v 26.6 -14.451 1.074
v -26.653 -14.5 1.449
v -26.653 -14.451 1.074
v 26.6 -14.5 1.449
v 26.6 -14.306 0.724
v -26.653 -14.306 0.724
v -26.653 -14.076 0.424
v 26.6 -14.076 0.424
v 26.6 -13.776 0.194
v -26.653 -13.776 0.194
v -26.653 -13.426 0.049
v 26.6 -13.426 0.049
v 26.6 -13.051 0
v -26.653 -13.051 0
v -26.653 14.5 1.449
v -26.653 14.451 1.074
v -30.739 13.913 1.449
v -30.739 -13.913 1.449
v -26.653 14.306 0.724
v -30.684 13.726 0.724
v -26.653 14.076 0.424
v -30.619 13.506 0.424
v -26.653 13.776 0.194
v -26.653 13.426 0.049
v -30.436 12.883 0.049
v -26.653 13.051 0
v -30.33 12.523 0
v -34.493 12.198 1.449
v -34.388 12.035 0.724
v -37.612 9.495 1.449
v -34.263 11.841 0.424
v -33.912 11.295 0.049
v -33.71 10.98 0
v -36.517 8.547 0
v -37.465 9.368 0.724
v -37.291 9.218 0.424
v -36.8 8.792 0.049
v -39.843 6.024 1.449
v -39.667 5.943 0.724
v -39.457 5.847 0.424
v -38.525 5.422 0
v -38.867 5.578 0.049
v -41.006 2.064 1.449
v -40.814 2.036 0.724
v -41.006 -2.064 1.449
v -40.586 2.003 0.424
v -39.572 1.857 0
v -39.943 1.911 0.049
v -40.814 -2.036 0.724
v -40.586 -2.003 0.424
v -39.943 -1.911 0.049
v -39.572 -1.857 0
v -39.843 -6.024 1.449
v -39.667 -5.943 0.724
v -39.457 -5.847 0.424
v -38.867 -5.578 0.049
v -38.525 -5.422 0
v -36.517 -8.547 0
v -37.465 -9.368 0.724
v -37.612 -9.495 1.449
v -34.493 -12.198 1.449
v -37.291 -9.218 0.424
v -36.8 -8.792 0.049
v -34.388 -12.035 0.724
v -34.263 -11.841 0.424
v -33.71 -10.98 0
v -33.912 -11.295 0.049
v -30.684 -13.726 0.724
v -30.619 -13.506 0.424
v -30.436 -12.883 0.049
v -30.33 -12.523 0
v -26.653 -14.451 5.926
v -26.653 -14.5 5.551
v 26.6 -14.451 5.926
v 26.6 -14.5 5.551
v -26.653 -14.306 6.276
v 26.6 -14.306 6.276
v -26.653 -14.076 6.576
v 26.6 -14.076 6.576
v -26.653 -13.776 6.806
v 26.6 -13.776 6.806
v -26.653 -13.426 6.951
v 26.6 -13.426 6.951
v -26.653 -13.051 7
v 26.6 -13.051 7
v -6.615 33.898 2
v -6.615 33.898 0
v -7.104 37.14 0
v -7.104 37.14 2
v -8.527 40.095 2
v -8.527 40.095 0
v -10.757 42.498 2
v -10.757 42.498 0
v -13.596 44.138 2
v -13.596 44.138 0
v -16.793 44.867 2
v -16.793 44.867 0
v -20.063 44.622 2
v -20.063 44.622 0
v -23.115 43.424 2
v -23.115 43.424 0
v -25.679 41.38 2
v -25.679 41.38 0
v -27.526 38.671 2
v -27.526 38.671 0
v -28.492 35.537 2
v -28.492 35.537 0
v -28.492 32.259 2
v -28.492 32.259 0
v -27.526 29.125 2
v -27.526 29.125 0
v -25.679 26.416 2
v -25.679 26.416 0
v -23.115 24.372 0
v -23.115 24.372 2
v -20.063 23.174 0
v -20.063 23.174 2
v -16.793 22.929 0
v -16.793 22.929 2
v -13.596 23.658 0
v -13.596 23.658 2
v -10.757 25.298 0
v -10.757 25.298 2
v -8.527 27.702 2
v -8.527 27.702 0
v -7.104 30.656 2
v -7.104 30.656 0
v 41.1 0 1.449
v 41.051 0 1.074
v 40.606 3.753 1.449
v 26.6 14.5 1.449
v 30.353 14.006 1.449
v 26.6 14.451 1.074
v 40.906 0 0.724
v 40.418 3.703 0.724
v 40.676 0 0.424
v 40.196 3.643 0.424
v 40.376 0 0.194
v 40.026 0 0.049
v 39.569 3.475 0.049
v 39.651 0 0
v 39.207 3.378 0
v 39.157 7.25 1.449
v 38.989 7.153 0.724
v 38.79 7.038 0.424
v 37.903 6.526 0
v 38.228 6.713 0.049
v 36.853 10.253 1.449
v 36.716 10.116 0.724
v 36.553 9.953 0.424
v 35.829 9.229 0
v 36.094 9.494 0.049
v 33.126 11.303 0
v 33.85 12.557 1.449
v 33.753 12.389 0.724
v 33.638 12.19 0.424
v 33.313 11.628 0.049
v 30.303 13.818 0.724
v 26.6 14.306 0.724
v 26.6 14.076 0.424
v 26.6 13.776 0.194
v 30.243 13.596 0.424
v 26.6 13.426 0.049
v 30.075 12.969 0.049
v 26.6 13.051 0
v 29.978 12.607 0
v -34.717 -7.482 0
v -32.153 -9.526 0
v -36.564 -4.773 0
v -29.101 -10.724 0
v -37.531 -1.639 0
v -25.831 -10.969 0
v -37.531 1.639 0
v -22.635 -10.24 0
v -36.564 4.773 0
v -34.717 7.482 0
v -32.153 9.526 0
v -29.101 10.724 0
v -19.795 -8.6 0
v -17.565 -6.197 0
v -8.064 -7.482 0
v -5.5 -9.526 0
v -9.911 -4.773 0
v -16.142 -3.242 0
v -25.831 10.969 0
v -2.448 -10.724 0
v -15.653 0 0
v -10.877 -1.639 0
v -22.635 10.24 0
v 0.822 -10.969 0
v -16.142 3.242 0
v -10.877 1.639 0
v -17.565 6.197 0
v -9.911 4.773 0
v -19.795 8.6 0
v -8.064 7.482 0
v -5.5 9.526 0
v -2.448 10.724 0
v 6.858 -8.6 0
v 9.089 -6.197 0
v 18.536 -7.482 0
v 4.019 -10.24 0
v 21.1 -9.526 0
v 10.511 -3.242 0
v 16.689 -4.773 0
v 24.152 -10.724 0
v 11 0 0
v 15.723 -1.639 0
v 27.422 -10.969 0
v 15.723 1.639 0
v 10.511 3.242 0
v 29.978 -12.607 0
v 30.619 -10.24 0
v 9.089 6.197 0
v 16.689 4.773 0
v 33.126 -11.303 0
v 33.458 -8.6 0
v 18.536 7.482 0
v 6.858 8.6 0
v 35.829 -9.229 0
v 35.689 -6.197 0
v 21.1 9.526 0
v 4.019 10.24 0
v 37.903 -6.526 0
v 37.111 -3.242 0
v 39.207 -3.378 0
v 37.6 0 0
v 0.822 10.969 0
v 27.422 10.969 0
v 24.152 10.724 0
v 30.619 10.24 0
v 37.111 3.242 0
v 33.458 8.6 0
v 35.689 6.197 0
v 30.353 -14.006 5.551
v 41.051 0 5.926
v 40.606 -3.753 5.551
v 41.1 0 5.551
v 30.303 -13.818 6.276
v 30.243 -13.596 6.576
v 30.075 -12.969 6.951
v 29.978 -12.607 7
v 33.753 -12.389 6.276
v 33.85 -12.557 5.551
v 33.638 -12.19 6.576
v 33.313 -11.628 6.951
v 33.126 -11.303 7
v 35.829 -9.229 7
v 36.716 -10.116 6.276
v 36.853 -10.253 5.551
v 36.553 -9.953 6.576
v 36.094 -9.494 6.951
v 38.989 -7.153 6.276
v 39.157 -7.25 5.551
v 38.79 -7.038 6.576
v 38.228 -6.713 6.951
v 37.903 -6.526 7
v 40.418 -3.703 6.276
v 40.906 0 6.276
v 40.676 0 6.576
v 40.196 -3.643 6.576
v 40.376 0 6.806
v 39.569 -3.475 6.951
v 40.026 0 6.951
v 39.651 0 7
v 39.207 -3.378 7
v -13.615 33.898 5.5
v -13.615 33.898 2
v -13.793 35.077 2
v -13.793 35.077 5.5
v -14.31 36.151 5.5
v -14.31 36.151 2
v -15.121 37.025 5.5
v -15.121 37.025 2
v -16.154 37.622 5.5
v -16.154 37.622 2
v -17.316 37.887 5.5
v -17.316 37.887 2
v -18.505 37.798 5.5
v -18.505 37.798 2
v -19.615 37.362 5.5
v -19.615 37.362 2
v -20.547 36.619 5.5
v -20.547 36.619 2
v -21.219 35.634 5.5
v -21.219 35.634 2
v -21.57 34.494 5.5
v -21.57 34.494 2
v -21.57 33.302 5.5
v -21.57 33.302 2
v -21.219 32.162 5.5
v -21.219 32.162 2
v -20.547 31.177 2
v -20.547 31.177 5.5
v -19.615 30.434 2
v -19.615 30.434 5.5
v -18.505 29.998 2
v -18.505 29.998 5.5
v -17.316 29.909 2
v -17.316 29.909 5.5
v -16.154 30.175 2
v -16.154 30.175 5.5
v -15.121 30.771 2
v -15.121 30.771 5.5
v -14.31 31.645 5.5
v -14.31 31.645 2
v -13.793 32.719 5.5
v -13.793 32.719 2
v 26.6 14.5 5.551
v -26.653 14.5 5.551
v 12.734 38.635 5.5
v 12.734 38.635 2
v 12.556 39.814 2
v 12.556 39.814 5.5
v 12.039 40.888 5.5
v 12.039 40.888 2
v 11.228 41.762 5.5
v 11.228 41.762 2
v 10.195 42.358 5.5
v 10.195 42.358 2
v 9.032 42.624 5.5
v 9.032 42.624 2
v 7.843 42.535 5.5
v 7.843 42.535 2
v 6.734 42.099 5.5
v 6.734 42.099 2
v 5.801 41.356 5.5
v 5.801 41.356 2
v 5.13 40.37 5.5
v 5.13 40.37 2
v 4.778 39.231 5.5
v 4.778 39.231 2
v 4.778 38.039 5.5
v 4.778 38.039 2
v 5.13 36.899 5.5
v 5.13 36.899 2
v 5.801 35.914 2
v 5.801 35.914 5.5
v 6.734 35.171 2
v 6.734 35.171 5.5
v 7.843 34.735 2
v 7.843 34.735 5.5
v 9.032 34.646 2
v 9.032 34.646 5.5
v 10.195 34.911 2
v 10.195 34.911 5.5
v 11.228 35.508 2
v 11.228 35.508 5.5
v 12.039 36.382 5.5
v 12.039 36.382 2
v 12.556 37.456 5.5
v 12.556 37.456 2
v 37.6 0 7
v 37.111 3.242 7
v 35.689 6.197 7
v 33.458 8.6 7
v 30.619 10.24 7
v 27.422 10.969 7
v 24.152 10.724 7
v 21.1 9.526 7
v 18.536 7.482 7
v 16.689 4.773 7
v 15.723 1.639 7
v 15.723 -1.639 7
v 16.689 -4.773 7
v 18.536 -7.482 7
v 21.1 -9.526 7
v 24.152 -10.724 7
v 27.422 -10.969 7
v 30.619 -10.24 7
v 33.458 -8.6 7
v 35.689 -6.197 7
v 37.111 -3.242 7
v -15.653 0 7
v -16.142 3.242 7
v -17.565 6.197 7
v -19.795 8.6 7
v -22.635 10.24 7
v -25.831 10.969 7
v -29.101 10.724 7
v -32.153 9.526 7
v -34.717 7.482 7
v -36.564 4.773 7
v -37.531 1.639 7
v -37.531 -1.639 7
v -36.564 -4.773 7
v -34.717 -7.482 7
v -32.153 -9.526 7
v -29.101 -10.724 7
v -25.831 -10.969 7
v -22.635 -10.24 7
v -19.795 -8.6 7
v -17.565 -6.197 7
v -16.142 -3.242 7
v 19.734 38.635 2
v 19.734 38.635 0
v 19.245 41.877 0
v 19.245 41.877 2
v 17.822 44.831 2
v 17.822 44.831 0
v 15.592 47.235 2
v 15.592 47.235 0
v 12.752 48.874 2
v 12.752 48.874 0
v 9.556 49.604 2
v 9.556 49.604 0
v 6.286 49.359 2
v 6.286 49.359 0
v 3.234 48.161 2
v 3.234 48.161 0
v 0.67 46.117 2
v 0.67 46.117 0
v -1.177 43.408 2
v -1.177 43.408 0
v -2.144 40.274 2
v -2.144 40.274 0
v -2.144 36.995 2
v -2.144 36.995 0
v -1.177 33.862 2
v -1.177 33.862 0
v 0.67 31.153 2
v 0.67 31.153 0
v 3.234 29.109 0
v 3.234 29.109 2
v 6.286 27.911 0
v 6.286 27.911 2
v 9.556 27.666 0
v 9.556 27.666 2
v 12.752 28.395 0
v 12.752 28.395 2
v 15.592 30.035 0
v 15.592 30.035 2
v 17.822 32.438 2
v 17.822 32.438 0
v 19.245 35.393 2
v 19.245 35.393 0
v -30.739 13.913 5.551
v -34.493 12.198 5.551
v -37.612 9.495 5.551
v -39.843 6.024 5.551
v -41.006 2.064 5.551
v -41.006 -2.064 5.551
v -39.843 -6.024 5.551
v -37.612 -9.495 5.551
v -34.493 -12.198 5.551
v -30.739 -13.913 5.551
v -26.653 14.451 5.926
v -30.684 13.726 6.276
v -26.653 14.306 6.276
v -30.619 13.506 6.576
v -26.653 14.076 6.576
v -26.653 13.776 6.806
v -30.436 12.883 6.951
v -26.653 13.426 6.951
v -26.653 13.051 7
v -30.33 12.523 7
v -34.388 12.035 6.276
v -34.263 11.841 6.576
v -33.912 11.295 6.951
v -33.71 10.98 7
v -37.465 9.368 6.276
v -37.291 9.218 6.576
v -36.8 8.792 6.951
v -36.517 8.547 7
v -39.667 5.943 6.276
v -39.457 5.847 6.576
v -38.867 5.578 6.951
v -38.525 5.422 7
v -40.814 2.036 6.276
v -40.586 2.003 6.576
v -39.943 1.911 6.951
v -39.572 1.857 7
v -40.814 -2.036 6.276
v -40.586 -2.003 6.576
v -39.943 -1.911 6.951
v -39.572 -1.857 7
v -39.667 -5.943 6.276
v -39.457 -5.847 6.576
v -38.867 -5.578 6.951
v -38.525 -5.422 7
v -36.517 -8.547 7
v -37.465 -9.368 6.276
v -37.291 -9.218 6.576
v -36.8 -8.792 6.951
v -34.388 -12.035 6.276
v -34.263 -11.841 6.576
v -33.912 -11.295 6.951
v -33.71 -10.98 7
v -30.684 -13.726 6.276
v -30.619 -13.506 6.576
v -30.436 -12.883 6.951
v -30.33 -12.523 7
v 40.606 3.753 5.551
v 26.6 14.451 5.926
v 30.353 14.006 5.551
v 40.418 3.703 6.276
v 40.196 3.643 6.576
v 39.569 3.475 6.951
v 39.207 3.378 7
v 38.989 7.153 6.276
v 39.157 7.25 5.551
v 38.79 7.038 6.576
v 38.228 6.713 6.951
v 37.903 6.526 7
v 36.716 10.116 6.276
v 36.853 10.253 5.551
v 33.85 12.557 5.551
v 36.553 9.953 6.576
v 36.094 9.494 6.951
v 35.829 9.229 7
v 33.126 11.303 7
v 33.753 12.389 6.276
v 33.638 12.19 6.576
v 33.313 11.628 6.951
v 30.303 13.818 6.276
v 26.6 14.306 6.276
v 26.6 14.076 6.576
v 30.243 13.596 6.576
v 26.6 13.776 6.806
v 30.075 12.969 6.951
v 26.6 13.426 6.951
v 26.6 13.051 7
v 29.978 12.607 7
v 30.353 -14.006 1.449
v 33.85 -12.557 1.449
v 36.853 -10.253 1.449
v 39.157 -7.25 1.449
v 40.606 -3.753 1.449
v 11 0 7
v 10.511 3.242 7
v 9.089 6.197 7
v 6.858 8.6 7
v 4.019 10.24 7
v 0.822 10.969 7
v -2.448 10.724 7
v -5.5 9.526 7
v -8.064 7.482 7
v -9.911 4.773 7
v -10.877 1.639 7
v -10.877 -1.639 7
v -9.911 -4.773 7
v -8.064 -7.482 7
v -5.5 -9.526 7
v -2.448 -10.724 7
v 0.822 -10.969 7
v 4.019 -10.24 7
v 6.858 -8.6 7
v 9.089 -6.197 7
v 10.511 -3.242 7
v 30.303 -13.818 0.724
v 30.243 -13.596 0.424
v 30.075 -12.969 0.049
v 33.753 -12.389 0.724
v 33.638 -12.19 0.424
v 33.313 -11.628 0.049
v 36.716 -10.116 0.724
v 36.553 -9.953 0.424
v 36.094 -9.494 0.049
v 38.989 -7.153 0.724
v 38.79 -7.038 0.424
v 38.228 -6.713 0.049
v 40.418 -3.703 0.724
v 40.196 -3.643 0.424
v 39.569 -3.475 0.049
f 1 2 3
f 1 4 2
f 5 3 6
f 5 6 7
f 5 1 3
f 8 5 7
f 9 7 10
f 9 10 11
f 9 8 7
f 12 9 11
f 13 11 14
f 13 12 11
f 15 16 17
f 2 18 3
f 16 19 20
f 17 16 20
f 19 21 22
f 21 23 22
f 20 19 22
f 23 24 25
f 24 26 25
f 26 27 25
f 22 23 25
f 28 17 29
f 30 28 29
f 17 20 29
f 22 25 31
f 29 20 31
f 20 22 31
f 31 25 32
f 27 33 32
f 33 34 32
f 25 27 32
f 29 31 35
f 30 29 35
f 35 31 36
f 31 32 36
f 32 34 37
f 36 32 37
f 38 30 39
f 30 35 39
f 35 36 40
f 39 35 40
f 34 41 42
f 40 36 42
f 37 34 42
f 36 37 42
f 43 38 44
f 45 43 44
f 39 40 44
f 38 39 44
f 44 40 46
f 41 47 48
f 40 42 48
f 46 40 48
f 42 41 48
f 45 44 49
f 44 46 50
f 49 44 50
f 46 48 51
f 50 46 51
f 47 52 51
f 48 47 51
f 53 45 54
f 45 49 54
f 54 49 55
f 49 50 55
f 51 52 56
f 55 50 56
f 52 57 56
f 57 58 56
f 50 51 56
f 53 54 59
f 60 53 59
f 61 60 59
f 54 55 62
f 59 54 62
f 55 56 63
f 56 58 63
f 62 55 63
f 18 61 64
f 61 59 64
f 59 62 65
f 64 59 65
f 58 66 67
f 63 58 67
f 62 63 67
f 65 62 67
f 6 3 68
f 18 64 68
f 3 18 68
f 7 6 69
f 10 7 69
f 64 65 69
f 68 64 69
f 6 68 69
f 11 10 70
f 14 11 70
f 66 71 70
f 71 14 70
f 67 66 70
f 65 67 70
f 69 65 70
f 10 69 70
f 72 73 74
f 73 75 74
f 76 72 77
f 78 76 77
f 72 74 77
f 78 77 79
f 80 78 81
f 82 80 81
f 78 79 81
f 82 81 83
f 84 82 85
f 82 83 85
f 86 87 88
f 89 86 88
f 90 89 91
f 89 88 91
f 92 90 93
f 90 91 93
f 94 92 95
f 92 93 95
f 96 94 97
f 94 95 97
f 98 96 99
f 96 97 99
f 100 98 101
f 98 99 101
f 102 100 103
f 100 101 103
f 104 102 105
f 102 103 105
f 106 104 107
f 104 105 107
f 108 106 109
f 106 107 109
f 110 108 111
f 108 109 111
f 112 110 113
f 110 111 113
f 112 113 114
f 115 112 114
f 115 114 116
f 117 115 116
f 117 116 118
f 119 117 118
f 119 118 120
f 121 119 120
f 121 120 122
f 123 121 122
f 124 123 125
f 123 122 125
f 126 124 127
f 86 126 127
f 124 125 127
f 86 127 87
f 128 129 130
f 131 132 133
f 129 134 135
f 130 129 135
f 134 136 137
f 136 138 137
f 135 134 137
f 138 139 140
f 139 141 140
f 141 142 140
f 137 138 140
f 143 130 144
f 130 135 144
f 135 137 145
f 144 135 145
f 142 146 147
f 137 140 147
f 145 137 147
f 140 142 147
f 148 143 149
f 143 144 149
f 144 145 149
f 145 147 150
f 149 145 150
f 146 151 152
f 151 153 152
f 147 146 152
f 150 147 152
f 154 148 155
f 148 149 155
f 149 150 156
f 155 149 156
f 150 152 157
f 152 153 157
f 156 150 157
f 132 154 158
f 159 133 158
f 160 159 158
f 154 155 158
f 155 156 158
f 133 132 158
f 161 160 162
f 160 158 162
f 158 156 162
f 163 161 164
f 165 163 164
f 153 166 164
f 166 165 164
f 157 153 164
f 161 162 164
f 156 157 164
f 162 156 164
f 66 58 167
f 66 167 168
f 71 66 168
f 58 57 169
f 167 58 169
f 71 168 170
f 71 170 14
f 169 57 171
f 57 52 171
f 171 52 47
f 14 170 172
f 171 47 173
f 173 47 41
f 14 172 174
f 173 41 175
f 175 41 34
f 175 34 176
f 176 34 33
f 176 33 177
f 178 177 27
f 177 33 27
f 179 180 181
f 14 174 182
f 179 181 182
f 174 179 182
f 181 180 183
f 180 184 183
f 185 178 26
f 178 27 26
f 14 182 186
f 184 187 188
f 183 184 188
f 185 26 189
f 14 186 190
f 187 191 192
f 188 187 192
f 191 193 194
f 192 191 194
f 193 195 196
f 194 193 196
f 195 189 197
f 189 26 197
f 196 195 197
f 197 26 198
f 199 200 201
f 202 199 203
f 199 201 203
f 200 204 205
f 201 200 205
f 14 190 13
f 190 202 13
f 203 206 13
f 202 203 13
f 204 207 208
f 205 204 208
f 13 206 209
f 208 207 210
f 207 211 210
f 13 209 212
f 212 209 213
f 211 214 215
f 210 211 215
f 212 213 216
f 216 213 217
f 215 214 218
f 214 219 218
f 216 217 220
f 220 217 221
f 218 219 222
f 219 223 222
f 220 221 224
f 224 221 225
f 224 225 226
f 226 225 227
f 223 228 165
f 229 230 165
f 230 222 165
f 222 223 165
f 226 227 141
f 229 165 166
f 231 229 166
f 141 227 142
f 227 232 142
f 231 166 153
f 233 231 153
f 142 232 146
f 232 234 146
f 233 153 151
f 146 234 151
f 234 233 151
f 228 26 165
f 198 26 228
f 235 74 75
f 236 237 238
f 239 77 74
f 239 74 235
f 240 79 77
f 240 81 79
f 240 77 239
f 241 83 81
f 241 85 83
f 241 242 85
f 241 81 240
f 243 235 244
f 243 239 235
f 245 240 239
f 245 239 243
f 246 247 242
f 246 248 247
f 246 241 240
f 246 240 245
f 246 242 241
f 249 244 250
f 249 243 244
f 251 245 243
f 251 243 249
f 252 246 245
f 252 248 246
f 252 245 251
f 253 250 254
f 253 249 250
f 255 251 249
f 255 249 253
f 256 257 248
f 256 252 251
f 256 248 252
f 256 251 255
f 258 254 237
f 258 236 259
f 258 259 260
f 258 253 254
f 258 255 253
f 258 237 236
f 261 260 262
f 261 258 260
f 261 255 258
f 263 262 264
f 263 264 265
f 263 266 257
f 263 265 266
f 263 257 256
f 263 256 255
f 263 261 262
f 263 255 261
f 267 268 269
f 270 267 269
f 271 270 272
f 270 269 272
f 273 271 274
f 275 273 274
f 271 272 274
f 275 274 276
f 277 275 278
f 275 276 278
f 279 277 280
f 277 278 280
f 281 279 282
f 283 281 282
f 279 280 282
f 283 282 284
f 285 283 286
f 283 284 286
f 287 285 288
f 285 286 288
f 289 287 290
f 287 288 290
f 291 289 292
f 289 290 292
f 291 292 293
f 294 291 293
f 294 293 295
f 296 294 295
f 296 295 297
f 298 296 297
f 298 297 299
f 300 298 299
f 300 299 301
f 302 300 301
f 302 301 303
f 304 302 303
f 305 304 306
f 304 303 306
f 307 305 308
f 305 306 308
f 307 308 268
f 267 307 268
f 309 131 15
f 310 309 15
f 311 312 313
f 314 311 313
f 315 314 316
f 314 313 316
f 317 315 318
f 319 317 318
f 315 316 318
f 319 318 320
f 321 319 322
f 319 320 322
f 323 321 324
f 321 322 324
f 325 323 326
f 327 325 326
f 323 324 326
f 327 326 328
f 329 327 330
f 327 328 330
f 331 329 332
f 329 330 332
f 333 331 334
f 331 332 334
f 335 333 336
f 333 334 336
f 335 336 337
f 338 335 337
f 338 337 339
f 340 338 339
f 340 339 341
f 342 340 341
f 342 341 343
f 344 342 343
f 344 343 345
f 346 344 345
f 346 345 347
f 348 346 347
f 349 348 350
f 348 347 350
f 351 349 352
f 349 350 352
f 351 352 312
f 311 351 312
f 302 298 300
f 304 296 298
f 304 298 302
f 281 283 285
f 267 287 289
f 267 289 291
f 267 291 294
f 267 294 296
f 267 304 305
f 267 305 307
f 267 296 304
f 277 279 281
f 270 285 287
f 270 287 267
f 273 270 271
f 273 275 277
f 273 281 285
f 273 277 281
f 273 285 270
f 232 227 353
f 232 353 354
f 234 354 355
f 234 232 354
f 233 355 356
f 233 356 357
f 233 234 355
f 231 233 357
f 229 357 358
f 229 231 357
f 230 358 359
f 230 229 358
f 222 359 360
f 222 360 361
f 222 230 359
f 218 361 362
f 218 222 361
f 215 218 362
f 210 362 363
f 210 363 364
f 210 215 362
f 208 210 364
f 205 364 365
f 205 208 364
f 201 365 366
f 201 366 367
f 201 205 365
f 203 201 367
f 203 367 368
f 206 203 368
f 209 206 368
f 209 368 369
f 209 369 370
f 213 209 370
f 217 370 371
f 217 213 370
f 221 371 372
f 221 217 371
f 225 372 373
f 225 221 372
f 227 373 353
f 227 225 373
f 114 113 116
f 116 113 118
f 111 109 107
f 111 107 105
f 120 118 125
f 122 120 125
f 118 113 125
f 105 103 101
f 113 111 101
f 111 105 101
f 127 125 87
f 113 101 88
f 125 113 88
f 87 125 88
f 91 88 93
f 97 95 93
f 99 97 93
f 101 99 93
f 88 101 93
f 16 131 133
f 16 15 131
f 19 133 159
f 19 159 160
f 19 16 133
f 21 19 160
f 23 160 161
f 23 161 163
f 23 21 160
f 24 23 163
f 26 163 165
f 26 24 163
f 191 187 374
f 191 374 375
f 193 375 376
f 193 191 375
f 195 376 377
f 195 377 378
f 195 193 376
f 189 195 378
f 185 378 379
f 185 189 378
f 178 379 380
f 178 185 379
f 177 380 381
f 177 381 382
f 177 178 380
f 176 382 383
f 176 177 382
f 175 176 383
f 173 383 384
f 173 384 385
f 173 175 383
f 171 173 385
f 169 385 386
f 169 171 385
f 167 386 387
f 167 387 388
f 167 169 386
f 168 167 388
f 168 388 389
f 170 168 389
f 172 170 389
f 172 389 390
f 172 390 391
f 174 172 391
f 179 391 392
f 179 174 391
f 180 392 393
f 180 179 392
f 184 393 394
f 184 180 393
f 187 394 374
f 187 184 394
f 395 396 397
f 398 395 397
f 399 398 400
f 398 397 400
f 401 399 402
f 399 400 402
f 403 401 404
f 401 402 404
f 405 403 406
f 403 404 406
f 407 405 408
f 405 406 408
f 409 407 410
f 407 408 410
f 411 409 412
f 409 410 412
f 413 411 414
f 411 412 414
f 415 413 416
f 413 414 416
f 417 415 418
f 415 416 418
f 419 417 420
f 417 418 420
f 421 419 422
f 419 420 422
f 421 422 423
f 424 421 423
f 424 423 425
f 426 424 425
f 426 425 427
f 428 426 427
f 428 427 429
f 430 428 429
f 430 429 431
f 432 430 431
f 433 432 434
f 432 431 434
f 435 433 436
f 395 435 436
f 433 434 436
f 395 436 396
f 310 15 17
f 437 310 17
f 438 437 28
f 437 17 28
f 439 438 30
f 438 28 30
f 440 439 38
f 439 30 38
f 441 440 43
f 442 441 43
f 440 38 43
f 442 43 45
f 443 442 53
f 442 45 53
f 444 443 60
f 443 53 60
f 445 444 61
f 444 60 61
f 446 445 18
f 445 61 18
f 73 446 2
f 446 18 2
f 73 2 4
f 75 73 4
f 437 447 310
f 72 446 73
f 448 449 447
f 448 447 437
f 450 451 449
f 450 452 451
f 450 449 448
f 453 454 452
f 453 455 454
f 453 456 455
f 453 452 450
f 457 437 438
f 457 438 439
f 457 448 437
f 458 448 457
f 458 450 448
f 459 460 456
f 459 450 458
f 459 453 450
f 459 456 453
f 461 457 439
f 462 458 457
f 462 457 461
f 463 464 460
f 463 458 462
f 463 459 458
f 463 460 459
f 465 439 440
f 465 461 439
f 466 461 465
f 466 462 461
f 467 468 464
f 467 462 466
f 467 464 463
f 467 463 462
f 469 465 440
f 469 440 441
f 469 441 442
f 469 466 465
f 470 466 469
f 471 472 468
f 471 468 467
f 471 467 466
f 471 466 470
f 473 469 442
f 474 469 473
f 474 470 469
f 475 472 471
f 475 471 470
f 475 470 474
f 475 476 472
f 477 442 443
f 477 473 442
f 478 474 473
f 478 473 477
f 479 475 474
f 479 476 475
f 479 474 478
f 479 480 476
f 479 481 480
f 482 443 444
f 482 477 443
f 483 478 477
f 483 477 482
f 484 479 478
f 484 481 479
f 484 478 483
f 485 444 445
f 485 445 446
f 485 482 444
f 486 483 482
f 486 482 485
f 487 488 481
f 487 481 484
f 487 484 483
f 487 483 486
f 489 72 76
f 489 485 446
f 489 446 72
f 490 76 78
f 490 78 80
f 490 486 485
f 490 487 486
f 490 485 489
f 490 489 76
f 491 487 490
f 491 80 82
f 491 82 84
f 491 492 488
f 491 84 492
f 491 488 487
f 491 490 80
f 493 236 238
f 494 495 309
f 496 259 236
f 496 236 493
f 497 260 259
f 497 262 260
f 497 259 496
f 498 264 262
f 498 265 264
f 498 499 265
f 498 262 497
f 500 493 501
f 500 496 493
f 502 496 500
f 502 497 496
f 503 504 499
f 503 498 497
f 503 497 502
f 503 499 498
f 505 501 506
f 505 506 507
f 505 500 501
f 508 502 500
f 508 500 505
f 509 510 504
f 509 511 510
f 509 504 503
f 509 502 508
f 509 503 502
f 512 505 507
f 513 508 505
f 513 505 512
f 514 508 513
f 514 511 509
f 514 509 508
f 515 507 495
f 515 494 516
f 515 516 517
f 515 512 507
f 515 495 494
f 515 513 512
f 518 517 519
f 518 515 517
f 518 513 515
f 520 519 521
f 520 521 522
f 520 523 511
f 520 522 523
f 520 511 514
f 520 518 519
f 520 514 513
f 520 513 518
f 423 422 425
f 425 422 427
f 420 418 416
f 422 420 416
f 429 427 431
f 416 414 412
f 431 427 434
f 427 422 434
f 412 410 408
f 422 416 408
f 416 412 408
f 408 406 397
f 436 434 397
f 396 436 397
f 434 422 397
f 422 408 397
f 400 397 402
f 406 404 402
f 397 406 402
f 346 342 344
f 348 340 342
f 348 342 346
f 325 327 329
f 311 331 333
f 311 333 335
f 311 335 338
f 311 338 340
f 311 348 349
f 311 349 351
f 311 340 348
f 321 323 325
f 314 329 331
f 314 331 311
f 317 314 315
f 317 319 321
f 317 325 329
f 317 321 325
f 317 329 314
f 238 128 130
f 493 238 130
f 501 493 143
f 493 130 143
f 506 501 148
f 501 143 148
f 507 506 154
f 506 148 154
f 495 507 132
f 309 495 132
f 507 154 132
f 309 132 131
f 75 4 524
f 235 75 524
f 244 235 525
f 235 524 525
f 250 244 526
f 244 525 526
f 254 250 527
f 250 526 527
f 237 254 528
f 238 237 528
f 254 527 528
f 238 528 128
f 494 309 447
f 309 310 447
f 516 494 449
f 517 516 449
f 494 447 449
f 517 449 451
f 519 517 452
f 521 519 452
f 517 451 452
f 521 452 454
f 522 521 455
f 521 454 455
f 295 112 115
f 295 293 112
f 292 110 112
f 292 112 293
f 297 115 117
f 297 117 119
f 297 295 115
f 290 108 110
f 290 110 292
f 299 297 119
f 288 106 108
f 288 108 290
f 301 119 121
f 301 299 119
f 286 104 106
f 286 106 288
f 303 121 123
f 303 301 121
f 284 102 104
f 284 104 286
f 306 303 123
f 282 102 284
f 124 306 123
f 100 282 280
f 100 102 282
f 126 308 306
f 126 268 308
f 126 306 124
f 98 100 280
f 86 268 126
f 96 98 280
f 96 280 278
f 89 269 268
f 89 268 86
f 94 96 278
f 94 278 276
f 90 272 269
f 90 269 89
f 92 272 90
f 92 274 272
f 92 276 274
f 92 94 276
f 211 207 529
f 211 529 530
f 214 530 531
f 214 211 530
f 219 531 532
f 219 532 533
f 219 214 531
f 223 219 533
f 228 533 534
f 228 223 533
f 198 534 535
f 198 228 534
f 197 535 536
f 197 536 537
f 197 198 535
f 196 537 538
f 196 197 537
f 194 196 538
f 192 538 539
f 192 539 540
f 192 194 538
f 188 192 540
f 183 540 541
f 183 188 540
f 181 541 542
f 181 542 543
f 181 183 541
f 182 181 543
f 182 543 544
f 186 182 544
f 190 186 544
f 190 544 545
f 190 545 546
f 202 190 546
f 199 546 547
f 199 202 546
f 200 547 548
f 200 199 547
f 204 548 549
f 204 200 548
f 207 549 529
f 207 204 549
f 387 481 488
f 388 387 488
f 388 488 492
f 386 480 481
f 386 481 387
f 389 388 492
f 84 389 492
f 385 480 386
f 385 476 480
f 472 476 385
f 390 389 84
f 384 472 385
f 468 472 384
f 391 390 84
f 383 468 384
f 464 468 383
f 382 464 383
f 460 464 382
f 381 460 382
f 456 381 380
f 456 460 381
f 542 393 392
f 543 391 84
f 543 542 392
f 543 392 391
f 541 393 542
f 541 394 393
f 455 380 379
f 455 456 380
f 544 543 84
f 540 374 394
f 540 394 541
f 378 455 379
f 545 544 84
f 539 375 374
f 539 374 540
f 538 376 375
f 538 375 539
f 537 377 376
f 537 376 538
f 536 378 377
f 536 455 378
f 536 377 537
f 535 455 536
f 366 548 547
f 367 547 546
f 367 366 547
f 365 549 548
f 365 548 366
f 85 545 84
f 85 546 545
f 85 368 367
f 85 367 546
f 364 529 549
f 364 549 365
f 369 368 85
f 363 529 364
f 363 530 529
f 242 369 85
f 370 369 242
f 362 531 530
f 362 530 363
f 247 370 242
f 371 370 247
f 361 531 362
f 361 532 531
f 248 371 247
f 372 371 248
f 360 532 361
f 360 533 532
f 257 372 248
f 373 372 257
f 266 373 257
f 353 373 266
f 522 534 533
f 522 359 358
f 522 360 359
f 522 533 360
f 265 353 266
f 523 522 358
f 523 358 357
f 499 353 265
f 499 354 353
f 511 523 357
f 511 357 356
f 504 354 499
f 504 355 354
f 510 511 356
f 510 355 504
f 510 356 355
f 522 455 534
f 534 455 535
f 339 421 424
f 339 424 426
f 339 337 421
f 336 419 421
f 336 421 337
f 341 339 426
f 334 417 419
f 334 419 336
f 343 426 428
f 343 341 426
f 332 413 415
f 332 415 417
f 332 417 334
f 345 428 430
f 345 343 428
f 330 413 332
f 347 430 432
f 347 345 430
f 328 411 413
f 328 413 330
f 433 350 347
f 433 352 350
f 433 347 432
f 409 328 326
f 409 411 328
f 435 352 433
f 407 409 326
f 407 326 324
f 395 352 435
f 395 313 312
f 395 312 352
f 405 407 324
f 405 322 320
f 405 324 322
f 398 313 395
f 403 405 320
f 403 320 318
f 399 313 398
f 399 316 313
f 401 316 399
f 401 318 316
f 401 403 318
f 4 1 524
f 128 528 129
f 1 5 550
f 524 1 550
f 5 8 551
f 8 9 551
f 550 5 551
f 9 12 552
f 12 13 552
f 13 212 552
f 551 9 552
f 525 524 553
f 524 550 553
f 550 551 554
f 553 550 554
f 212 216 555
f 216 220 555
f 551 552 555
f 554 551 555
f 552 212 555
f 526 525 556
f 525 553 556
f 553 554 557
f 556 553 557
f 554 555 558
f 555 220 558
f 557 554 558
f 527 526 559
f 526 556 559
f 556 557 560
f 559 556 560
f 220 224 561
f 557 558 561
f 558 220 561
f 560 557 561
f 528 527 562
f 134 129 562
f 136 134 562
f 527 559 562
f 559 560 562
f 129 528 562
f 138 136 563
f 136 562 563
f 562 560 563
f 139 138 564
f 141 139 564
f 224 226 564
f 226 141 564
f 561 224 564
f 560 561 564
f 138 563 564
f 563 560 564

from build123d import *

# Parameters (mm, degrees)
F0_R      = 11
F1_DEPTH  = 7
F2_R      = 1.448528
F3_R      = 11
F4_DEPTH  = 2
F5_R      = 4
F6_DEPTH  = 3.5
F7_R      = 11
F8_DEPTH  = 2
F9_R      = 4
F10_DEPTH = 3.5


with BuildPart() as f1:
    # F0 (on Top) → F1 (new body)
    with BuildSketch(Plane.XY):
        with BuildLine():
            ThreePointArc((-26.653456, 14.5), (-16.400407, 10.253048), (-12.153456, 0))
            ThreePointArc((-12.153456, 0), (-16.400407, -10.253048), (-26.653456, -14.5))
            Line((-26.653456, -14.5), (26.6, -14.5))
            ThreePointArc((26.6, -14.5), (12.1, 0), (26.6, 14.5))
            Line((26.6, 14.5), (-26.653456, 14.5))
        make_face()
        Circle(F0_R, mode=Mode.SUBTRACT)
        with BuildLine():
            ThreePointArc((-26.653456, -14.5), (-16.400407, -10.253048), (-12.153456, 0))
            ThreePointArc((-12.153456, 0), (-16.400407, 10.253048), (-26.653456, 14.5))
            ThreePointArc((-26.653456, 14.5), (-41.153456, 0), (-26.653456, -14.5))
        make_face()
        with Locations((-26.653456, 0)):
            Circle(F0_R, mode=Mode.SUBTRACT)
        with BuildLine():
            ThreePointArc((41.1, 0), (36.853048, 10.253048), (26.6, 14.5))
            ThreePointArc((26.6, 14.5), (12.1, 0), (26.6, -14.5))
            ThreePointArc((26.6, -14.5), (36.853048, -10.253048), (41.1, 0))
        make_face()
        with Locations((26.6, 0)):
            Circle(F0_R, mode=Mode.SUBTRACT)
    extrude(amount=F1_DEPTH)

    # F2
    f2_edges = [f1.edges().sort_by_distance(p)[0] for p in [
        (-0.026728, 14.5, 7),
        (-41.153456, 0, 7),
        (41.1, 0, 7),
        (-41.153456, 0, 0),
        (-0.026728, -14.5, 0),
        (41.1, 0, 0),
    ]]
    fillet(f2_edges, radius=F2_R)


with BuildPart() as f4:
    # F3 (on Top) → F4 (new body)
    with BuildSketch(Plane.XY):
        with Locations((-17.615132, 33.898026)):
            Circle(F3_R)
    extrude(amount=F4_DEPTH)

    # F5 (on face) → F6 (join)
    with BuildSketch(Plane.XY.offset(2)):
        with Locations((-17.615132, 33.898026)):
            Circle(F5_R)
    extrude(amount=F6_DEPTH)


with BuildPart() as f8:
    # F7 (on Top) → F8 (new body)
    with BuildSketch(Plane.XY):
        with Locations((8.733553, 38.63487)):
            Circle(F7_R)
    extrude(amount=F8_DEPTH)

    # F9 (on face) → F10 (join)
    with BuildSketch(Plane.XY.offset(2)):
        with Locations((8.733553, 38.63487)):
            Circle(F9_R)
    extrude(amount=F10_DEPTH)


solid = Compound([f1.part, f4.part, f8.part])
